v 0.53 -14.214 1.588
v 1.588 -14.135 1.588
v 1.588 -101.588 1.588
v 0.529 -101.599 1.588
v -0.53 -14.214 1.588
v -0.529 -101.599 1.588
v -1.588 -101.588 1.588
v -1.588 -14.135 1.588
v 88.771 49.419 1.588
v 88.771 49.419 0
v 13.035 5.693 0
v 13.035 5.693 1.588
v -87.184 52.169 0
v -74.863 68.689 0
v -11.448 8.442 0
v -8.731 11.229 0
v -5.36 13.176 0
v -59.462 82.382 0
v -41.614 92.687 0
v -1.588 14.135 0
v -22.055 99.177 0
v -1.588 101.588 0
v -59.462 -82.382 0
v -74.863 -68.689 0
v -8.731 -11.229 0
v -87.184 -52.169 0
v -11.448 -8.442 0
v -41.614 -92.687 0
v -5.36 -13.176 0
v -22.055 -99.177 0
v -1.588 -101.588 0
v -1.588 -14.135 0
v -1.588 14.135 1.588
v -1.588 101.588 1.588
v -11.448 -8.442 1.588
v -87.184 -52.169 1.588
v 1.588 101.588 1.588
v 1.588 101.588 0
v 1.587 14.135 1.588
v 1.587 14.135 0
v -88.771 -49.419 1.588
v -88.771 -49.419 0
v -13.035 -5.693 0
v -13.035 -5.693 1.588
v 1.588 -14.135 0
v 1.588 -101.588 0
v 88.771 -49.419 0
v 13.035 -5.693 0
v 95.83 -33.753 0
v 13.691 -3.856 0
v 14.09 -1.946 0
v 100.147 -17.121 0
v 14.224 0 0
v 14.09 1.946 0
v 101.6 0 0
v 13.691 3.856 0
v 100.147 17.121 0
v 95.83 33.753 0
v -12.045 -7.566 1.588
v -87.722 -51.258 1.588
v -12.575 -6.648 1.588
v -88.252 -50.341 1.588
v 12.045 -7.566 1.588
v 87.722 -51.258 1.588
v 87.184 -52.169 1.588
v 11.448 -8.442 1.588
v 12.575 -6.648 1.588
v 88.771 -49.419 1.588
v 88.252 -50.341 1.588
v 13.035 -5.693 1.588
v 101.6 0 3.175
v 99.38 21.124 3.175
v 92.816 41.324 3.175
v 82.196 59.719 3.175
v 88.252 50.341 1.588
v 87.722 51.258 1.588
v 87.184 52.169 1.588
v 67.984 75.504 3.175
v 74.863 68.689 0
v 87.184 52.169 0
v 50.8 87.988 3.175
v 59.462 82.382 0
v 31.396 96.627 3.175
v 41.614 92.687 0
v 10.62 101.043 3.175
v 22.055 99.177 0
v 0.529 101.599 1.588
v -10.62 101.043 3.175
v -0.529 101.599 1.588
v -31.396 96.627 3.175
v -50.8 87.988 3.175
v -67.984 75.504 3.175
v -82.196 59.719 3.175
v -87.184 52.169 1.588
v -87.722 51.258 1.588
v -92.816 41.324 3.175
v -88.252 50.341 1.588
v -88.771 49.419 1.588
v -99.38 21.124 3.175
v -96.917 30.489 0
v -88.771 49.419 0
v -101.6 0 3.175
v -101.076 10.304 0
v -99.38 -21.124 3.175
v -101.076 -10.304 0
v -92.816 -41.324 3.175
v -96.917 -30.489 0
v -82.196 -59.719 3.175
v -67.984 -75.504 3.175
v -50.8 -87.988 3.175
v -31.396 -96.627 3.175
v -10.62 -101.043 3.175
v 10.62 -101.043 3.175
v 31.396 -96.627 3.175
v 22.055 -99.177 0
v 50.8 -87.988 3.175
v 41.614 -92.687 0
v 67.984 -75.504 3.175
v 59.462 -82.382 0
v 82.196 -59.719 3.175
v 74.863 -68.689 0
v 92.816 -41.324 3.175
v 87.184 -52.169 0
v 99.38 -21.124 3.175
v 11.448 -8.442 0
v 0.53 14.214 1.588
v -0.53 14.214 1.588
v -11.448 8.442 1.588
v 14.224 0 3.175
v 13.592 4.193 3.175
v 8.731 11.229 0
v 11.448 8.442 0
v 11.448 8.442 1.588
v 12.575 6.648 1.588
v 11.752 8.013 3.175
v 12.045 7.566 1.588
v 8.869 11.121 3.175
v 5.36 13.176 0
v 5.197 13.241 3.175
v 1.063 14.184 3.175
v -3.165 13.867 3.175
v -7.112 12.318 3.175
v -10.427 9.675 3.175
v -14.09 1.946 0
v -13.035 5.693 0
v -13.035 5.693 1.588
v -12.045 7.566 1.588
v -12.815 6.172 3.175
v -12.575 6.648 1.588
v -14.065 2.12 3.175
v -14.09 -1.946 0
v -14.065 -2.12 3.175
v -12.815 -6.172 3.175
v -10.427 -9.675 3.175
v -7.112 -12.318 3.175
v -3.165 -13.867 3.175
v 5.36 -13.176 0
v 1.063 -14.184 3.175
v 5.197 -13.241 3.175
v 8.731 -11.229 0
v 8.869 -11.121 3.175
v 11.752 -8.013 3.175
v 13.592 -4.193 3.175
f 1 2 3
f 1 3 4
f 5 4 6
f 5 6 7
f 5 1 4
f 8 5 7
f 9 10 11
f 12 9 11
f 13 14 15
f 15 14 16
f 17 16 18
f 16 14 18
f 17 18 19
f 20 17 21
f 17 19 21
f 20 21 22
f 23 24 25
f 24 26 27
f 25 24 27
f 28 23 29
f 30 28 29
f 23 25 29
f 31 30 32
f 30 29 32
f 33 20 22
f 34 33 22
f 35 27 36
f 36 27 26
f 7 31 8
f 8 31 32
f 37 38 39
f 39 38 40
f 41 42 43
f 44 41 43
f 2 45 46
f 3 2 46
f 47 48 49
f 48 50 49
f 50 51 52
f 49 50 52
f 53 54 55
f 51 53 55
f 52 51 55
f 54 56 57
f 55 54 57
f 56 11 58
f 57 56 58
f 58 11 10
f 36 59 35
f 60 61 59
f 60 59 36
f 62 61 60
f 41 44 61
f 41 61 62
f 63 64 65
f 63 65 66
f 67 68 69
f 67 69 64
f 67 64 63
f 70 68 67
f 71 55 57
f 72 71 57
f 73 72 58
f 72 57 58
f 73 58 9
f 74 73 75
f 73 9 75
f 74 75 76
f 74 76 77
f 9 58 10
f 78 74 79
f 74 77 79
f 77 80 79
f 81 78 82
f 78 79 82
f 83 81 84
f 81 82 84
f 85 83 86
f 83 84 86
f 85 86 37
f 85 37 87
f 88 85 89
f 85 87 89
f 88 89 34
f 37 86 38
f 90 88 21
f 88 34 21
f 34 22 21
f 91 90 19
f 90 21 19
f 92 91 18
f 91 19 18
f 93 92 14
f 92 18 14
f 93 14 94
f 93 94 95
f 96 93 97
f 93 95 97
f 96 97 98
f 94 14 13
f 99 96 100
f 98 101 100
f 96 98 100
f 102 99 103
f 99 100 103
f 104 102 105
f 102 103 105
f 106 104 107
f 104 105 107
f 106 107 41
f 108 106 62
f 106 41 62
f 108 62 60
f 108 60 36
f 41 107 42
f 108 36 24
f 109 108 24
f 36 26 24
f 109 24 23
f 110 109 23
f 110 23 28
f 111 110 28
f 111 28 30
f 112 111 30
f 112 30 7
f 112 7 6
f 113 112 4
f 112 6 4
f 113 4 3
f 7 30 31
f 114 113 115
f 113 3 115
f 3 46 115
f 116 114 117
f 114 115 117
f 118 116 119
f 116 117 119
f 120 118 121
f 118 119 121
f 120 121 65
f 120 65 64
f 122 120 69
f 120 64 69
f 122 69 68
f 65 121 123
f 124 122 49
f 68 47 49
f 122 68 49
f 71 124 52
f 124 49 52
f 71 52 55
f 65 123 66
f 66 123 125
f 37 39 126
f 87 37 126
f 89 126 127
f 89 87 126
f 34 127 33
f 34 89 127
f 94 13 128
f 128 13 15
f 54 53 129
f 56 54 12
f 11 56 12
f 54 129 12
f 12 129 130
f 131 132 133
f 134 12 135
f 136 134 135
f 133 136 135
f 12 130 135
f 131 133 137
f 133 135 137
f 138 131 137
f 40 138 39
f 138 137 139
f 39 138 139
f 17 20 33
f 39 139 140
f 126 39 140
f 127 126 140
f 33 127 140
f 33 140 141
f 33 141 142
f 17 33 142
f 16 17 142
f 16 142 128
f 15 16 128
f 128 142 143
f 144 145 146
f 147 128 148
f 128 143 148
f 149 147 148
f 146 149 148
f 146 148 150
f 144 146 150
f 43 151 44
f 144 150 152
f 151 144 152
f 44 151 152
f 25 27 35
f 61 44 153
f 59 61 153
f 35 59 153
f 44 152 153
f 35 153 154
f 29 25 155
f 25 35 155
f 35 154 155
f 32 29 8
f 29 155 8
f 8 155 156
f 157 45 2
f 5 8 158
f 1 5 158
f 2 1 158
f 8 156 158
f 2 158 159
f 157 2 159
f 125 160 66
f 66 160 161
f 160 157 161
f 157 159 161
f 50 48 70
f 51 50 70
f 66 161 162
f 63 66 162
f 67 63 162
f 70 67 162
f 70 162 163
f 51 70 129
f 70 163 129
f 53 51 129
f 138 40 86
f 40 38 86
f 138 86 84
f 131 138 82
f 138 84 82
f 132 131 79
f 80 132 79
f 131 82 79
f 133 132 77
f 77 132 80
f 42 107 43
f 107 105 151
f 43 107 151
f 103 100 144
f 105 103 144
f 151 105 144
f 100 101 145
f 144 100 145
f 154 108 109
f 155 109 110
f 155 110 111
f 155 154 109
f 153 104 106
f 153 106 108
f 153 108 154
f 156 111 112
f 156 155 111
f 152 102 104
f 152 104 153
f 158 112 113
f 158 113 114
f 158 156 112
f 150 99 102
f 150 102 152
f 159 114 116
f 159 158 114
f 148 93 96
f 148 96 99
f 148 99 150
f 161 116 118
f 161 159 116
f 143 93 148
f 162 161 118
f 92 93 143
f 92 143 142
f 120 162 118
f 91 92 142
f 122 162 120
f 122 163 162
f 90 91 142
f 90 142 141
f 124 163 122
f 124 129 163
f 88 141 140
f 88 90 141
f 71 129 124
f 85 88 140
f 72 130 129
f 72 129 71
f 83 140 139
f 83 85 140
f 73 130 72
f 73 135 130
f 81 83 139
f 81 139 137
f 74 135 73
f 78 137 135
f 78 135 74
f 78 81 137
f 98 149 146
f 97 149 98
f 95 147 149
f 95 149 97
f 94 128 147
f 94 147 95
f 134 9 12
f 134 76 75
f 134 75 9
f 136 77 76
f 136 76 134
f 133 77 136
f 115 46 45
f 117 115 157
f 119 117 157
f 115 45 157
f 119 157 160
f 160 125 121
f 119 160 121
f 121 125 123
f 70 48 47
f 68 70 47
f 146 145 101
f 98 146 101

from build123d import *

# Parameters (mm, degrees)
SKETCH1_R           = 101.6
BOSS_EXTRUDE1_DEPTH = 3.175
CUT_EXTRUDE3_DEPTH  = 1.5875
SKETCH3_R           = 14.224
CUT_EXTRUDE4_DEPTH  = 4.175


with BuildPart() as part:
    # Sketch1 → Boss-Extrude1 (new body)
    with BuildSketch(Plane.XY):
        Circle(SKETCH1_R)
    extrude(amount=BOSS_EXTRUDE1_DEPTH)

    # Sketch2 → Cut-Extrude3 (cut)
    with BuildSketch(Plane(origin=(0, 0, 0), x_dir=(-1, 0, 0), z_dir=(0, 0, -1))):
        with BuildLine():
            ThreePointArc((-88.771189624, -49.418983121), (-87.988181024, -50.8), (-87.183689624, -52.168613778))
            Line((-87.183689624, -52.168613778), (-1.5875, -2.749630657))
            Line((-1.5875, -2.749630657), (-1.5875, -0.916543552))
            Line((-1.5875, -0.916543552), (-3.175, 0))
            Line((-3.175, 0), (-88.771189624, -49.418983121))
        make_face()
        Polygon((-1.5875, -0.916543552), (-1.5875, -2.749630657), (0, -1.833087105), align=None)
        Polygon((-1.5875, -0.916543552), (0, -1.833087105), (1.5875, -0.916543552), (1.5875, 0.916543552), (0, 1.833087105), (-1.5875, 0.916543552), align=None)
        Polygon((1.5875, -0.916543552), (0, -1.833087105), (1.5875, -2.749630657), align=None)
        Polygon((-3.175, 0), (-1.5875, -0.916543552), (-1.5875, 0.916543552), align=None)
        Polygon((-1.5875, 2.749630657), (-1.5875, 0.916543552), (0, 1.833087105), align=None)
        Polygon((0, 1.833087105), (1.5875, 0.916543552), (1.5875, 2.749630657), align=None)
        Polygon((1.5875, 0.916543552), (1.5875, -0.916543552), (3.175, 0), align=None)
        with BuildLine():
            Line((1.5875, 0.916543552), (3.175, 0))
            Line((3.175, 0), (88.771189624, 49.418983121))
            ThreePointArc((88.771189624, 49.418983121), (87.988181024, 50.8), (87.183689624, 52.168613778))
            Line((87.183689624, 52.168613778), (1.5875, 2.749630657))
            Line((1.5875, 2.749630657), (1.5875, 0.916543552))
        make_face()
        with BuildLine():
            Line((3.175, 0), (1.5875, -0.916543552))
            Line((1.5875, -0.916543552), (1.5875, -2.749630657))
            Line((1.5875, -2.749630657), (87.183689624, -52.168613778))
            ThreePointArc((87.183689624, -52.168613778), (87.988181024, -50.8), (88.771189624, -49.418983121))
            Line((88.771189624, -49.418983121), (3.175, 0))
        make_face()
        with BuildLine():
            Line((-1.5875, 2.749630657), (0, 1.833087105))
            Line((0, 1.833087105), (1.5875, 2.749630657))
            Line((1.5875, 2.749630657), (1.5875, 101.587596899))
            ThreePointArc((1.5875, 101.587596899), (0, 101.6), (-1.5875, 101.587596899))
            Line((-1.5875, 101.587596899), (-1.5875, 2.749630657))
        make_face()
        with BuildLine():
            Line((-88.771189624, 49.418983121), (-3.175, 0))
            Line((-3.175, 0), (-1.5875, 0.916543552))
            Line((-1.5875, 0.916543552), (-1.5875, 2.749630657))
            Line((-1.5875, 2.749630657), (-87.183689624, 52.168613778))
            ThreePointArc((-87.183689624, 52.168613778), (-87.988181024, 50.8), (-88.771189624, 49.418983121))
        make_face()
        with BuildLine():
            Line((0, -1.833087105), (-1.5875, -2.749630657))
            Line((-1.5875, -2.749630657), (-1.5875, -101.587596899))
            ThreePointArc((-1.5875, -101.587596899), (0, -101.6), (1.5875, -101.587596899))
            Line((1.5875, -101.587596899), (1.5875, -2.749630657))
            Line((1.5875, -2.749630657), (0, -1.833087105))
        make_face()
    extrude(amount=-CUT_EXTRUDE3_DEPTH, mode=Mode.SUBTRACT)

    # Sketch3 → Cut-Extrude4 (cut, through all)
    with BuildSketch(Plane.XY.offset(3.175)):
        Circle(SKETCH3_R)
    extrude(amount=-CUT_EXTRUDE4_DEPTH, mode=Mode.SUBTRACT)


solid = part.part
